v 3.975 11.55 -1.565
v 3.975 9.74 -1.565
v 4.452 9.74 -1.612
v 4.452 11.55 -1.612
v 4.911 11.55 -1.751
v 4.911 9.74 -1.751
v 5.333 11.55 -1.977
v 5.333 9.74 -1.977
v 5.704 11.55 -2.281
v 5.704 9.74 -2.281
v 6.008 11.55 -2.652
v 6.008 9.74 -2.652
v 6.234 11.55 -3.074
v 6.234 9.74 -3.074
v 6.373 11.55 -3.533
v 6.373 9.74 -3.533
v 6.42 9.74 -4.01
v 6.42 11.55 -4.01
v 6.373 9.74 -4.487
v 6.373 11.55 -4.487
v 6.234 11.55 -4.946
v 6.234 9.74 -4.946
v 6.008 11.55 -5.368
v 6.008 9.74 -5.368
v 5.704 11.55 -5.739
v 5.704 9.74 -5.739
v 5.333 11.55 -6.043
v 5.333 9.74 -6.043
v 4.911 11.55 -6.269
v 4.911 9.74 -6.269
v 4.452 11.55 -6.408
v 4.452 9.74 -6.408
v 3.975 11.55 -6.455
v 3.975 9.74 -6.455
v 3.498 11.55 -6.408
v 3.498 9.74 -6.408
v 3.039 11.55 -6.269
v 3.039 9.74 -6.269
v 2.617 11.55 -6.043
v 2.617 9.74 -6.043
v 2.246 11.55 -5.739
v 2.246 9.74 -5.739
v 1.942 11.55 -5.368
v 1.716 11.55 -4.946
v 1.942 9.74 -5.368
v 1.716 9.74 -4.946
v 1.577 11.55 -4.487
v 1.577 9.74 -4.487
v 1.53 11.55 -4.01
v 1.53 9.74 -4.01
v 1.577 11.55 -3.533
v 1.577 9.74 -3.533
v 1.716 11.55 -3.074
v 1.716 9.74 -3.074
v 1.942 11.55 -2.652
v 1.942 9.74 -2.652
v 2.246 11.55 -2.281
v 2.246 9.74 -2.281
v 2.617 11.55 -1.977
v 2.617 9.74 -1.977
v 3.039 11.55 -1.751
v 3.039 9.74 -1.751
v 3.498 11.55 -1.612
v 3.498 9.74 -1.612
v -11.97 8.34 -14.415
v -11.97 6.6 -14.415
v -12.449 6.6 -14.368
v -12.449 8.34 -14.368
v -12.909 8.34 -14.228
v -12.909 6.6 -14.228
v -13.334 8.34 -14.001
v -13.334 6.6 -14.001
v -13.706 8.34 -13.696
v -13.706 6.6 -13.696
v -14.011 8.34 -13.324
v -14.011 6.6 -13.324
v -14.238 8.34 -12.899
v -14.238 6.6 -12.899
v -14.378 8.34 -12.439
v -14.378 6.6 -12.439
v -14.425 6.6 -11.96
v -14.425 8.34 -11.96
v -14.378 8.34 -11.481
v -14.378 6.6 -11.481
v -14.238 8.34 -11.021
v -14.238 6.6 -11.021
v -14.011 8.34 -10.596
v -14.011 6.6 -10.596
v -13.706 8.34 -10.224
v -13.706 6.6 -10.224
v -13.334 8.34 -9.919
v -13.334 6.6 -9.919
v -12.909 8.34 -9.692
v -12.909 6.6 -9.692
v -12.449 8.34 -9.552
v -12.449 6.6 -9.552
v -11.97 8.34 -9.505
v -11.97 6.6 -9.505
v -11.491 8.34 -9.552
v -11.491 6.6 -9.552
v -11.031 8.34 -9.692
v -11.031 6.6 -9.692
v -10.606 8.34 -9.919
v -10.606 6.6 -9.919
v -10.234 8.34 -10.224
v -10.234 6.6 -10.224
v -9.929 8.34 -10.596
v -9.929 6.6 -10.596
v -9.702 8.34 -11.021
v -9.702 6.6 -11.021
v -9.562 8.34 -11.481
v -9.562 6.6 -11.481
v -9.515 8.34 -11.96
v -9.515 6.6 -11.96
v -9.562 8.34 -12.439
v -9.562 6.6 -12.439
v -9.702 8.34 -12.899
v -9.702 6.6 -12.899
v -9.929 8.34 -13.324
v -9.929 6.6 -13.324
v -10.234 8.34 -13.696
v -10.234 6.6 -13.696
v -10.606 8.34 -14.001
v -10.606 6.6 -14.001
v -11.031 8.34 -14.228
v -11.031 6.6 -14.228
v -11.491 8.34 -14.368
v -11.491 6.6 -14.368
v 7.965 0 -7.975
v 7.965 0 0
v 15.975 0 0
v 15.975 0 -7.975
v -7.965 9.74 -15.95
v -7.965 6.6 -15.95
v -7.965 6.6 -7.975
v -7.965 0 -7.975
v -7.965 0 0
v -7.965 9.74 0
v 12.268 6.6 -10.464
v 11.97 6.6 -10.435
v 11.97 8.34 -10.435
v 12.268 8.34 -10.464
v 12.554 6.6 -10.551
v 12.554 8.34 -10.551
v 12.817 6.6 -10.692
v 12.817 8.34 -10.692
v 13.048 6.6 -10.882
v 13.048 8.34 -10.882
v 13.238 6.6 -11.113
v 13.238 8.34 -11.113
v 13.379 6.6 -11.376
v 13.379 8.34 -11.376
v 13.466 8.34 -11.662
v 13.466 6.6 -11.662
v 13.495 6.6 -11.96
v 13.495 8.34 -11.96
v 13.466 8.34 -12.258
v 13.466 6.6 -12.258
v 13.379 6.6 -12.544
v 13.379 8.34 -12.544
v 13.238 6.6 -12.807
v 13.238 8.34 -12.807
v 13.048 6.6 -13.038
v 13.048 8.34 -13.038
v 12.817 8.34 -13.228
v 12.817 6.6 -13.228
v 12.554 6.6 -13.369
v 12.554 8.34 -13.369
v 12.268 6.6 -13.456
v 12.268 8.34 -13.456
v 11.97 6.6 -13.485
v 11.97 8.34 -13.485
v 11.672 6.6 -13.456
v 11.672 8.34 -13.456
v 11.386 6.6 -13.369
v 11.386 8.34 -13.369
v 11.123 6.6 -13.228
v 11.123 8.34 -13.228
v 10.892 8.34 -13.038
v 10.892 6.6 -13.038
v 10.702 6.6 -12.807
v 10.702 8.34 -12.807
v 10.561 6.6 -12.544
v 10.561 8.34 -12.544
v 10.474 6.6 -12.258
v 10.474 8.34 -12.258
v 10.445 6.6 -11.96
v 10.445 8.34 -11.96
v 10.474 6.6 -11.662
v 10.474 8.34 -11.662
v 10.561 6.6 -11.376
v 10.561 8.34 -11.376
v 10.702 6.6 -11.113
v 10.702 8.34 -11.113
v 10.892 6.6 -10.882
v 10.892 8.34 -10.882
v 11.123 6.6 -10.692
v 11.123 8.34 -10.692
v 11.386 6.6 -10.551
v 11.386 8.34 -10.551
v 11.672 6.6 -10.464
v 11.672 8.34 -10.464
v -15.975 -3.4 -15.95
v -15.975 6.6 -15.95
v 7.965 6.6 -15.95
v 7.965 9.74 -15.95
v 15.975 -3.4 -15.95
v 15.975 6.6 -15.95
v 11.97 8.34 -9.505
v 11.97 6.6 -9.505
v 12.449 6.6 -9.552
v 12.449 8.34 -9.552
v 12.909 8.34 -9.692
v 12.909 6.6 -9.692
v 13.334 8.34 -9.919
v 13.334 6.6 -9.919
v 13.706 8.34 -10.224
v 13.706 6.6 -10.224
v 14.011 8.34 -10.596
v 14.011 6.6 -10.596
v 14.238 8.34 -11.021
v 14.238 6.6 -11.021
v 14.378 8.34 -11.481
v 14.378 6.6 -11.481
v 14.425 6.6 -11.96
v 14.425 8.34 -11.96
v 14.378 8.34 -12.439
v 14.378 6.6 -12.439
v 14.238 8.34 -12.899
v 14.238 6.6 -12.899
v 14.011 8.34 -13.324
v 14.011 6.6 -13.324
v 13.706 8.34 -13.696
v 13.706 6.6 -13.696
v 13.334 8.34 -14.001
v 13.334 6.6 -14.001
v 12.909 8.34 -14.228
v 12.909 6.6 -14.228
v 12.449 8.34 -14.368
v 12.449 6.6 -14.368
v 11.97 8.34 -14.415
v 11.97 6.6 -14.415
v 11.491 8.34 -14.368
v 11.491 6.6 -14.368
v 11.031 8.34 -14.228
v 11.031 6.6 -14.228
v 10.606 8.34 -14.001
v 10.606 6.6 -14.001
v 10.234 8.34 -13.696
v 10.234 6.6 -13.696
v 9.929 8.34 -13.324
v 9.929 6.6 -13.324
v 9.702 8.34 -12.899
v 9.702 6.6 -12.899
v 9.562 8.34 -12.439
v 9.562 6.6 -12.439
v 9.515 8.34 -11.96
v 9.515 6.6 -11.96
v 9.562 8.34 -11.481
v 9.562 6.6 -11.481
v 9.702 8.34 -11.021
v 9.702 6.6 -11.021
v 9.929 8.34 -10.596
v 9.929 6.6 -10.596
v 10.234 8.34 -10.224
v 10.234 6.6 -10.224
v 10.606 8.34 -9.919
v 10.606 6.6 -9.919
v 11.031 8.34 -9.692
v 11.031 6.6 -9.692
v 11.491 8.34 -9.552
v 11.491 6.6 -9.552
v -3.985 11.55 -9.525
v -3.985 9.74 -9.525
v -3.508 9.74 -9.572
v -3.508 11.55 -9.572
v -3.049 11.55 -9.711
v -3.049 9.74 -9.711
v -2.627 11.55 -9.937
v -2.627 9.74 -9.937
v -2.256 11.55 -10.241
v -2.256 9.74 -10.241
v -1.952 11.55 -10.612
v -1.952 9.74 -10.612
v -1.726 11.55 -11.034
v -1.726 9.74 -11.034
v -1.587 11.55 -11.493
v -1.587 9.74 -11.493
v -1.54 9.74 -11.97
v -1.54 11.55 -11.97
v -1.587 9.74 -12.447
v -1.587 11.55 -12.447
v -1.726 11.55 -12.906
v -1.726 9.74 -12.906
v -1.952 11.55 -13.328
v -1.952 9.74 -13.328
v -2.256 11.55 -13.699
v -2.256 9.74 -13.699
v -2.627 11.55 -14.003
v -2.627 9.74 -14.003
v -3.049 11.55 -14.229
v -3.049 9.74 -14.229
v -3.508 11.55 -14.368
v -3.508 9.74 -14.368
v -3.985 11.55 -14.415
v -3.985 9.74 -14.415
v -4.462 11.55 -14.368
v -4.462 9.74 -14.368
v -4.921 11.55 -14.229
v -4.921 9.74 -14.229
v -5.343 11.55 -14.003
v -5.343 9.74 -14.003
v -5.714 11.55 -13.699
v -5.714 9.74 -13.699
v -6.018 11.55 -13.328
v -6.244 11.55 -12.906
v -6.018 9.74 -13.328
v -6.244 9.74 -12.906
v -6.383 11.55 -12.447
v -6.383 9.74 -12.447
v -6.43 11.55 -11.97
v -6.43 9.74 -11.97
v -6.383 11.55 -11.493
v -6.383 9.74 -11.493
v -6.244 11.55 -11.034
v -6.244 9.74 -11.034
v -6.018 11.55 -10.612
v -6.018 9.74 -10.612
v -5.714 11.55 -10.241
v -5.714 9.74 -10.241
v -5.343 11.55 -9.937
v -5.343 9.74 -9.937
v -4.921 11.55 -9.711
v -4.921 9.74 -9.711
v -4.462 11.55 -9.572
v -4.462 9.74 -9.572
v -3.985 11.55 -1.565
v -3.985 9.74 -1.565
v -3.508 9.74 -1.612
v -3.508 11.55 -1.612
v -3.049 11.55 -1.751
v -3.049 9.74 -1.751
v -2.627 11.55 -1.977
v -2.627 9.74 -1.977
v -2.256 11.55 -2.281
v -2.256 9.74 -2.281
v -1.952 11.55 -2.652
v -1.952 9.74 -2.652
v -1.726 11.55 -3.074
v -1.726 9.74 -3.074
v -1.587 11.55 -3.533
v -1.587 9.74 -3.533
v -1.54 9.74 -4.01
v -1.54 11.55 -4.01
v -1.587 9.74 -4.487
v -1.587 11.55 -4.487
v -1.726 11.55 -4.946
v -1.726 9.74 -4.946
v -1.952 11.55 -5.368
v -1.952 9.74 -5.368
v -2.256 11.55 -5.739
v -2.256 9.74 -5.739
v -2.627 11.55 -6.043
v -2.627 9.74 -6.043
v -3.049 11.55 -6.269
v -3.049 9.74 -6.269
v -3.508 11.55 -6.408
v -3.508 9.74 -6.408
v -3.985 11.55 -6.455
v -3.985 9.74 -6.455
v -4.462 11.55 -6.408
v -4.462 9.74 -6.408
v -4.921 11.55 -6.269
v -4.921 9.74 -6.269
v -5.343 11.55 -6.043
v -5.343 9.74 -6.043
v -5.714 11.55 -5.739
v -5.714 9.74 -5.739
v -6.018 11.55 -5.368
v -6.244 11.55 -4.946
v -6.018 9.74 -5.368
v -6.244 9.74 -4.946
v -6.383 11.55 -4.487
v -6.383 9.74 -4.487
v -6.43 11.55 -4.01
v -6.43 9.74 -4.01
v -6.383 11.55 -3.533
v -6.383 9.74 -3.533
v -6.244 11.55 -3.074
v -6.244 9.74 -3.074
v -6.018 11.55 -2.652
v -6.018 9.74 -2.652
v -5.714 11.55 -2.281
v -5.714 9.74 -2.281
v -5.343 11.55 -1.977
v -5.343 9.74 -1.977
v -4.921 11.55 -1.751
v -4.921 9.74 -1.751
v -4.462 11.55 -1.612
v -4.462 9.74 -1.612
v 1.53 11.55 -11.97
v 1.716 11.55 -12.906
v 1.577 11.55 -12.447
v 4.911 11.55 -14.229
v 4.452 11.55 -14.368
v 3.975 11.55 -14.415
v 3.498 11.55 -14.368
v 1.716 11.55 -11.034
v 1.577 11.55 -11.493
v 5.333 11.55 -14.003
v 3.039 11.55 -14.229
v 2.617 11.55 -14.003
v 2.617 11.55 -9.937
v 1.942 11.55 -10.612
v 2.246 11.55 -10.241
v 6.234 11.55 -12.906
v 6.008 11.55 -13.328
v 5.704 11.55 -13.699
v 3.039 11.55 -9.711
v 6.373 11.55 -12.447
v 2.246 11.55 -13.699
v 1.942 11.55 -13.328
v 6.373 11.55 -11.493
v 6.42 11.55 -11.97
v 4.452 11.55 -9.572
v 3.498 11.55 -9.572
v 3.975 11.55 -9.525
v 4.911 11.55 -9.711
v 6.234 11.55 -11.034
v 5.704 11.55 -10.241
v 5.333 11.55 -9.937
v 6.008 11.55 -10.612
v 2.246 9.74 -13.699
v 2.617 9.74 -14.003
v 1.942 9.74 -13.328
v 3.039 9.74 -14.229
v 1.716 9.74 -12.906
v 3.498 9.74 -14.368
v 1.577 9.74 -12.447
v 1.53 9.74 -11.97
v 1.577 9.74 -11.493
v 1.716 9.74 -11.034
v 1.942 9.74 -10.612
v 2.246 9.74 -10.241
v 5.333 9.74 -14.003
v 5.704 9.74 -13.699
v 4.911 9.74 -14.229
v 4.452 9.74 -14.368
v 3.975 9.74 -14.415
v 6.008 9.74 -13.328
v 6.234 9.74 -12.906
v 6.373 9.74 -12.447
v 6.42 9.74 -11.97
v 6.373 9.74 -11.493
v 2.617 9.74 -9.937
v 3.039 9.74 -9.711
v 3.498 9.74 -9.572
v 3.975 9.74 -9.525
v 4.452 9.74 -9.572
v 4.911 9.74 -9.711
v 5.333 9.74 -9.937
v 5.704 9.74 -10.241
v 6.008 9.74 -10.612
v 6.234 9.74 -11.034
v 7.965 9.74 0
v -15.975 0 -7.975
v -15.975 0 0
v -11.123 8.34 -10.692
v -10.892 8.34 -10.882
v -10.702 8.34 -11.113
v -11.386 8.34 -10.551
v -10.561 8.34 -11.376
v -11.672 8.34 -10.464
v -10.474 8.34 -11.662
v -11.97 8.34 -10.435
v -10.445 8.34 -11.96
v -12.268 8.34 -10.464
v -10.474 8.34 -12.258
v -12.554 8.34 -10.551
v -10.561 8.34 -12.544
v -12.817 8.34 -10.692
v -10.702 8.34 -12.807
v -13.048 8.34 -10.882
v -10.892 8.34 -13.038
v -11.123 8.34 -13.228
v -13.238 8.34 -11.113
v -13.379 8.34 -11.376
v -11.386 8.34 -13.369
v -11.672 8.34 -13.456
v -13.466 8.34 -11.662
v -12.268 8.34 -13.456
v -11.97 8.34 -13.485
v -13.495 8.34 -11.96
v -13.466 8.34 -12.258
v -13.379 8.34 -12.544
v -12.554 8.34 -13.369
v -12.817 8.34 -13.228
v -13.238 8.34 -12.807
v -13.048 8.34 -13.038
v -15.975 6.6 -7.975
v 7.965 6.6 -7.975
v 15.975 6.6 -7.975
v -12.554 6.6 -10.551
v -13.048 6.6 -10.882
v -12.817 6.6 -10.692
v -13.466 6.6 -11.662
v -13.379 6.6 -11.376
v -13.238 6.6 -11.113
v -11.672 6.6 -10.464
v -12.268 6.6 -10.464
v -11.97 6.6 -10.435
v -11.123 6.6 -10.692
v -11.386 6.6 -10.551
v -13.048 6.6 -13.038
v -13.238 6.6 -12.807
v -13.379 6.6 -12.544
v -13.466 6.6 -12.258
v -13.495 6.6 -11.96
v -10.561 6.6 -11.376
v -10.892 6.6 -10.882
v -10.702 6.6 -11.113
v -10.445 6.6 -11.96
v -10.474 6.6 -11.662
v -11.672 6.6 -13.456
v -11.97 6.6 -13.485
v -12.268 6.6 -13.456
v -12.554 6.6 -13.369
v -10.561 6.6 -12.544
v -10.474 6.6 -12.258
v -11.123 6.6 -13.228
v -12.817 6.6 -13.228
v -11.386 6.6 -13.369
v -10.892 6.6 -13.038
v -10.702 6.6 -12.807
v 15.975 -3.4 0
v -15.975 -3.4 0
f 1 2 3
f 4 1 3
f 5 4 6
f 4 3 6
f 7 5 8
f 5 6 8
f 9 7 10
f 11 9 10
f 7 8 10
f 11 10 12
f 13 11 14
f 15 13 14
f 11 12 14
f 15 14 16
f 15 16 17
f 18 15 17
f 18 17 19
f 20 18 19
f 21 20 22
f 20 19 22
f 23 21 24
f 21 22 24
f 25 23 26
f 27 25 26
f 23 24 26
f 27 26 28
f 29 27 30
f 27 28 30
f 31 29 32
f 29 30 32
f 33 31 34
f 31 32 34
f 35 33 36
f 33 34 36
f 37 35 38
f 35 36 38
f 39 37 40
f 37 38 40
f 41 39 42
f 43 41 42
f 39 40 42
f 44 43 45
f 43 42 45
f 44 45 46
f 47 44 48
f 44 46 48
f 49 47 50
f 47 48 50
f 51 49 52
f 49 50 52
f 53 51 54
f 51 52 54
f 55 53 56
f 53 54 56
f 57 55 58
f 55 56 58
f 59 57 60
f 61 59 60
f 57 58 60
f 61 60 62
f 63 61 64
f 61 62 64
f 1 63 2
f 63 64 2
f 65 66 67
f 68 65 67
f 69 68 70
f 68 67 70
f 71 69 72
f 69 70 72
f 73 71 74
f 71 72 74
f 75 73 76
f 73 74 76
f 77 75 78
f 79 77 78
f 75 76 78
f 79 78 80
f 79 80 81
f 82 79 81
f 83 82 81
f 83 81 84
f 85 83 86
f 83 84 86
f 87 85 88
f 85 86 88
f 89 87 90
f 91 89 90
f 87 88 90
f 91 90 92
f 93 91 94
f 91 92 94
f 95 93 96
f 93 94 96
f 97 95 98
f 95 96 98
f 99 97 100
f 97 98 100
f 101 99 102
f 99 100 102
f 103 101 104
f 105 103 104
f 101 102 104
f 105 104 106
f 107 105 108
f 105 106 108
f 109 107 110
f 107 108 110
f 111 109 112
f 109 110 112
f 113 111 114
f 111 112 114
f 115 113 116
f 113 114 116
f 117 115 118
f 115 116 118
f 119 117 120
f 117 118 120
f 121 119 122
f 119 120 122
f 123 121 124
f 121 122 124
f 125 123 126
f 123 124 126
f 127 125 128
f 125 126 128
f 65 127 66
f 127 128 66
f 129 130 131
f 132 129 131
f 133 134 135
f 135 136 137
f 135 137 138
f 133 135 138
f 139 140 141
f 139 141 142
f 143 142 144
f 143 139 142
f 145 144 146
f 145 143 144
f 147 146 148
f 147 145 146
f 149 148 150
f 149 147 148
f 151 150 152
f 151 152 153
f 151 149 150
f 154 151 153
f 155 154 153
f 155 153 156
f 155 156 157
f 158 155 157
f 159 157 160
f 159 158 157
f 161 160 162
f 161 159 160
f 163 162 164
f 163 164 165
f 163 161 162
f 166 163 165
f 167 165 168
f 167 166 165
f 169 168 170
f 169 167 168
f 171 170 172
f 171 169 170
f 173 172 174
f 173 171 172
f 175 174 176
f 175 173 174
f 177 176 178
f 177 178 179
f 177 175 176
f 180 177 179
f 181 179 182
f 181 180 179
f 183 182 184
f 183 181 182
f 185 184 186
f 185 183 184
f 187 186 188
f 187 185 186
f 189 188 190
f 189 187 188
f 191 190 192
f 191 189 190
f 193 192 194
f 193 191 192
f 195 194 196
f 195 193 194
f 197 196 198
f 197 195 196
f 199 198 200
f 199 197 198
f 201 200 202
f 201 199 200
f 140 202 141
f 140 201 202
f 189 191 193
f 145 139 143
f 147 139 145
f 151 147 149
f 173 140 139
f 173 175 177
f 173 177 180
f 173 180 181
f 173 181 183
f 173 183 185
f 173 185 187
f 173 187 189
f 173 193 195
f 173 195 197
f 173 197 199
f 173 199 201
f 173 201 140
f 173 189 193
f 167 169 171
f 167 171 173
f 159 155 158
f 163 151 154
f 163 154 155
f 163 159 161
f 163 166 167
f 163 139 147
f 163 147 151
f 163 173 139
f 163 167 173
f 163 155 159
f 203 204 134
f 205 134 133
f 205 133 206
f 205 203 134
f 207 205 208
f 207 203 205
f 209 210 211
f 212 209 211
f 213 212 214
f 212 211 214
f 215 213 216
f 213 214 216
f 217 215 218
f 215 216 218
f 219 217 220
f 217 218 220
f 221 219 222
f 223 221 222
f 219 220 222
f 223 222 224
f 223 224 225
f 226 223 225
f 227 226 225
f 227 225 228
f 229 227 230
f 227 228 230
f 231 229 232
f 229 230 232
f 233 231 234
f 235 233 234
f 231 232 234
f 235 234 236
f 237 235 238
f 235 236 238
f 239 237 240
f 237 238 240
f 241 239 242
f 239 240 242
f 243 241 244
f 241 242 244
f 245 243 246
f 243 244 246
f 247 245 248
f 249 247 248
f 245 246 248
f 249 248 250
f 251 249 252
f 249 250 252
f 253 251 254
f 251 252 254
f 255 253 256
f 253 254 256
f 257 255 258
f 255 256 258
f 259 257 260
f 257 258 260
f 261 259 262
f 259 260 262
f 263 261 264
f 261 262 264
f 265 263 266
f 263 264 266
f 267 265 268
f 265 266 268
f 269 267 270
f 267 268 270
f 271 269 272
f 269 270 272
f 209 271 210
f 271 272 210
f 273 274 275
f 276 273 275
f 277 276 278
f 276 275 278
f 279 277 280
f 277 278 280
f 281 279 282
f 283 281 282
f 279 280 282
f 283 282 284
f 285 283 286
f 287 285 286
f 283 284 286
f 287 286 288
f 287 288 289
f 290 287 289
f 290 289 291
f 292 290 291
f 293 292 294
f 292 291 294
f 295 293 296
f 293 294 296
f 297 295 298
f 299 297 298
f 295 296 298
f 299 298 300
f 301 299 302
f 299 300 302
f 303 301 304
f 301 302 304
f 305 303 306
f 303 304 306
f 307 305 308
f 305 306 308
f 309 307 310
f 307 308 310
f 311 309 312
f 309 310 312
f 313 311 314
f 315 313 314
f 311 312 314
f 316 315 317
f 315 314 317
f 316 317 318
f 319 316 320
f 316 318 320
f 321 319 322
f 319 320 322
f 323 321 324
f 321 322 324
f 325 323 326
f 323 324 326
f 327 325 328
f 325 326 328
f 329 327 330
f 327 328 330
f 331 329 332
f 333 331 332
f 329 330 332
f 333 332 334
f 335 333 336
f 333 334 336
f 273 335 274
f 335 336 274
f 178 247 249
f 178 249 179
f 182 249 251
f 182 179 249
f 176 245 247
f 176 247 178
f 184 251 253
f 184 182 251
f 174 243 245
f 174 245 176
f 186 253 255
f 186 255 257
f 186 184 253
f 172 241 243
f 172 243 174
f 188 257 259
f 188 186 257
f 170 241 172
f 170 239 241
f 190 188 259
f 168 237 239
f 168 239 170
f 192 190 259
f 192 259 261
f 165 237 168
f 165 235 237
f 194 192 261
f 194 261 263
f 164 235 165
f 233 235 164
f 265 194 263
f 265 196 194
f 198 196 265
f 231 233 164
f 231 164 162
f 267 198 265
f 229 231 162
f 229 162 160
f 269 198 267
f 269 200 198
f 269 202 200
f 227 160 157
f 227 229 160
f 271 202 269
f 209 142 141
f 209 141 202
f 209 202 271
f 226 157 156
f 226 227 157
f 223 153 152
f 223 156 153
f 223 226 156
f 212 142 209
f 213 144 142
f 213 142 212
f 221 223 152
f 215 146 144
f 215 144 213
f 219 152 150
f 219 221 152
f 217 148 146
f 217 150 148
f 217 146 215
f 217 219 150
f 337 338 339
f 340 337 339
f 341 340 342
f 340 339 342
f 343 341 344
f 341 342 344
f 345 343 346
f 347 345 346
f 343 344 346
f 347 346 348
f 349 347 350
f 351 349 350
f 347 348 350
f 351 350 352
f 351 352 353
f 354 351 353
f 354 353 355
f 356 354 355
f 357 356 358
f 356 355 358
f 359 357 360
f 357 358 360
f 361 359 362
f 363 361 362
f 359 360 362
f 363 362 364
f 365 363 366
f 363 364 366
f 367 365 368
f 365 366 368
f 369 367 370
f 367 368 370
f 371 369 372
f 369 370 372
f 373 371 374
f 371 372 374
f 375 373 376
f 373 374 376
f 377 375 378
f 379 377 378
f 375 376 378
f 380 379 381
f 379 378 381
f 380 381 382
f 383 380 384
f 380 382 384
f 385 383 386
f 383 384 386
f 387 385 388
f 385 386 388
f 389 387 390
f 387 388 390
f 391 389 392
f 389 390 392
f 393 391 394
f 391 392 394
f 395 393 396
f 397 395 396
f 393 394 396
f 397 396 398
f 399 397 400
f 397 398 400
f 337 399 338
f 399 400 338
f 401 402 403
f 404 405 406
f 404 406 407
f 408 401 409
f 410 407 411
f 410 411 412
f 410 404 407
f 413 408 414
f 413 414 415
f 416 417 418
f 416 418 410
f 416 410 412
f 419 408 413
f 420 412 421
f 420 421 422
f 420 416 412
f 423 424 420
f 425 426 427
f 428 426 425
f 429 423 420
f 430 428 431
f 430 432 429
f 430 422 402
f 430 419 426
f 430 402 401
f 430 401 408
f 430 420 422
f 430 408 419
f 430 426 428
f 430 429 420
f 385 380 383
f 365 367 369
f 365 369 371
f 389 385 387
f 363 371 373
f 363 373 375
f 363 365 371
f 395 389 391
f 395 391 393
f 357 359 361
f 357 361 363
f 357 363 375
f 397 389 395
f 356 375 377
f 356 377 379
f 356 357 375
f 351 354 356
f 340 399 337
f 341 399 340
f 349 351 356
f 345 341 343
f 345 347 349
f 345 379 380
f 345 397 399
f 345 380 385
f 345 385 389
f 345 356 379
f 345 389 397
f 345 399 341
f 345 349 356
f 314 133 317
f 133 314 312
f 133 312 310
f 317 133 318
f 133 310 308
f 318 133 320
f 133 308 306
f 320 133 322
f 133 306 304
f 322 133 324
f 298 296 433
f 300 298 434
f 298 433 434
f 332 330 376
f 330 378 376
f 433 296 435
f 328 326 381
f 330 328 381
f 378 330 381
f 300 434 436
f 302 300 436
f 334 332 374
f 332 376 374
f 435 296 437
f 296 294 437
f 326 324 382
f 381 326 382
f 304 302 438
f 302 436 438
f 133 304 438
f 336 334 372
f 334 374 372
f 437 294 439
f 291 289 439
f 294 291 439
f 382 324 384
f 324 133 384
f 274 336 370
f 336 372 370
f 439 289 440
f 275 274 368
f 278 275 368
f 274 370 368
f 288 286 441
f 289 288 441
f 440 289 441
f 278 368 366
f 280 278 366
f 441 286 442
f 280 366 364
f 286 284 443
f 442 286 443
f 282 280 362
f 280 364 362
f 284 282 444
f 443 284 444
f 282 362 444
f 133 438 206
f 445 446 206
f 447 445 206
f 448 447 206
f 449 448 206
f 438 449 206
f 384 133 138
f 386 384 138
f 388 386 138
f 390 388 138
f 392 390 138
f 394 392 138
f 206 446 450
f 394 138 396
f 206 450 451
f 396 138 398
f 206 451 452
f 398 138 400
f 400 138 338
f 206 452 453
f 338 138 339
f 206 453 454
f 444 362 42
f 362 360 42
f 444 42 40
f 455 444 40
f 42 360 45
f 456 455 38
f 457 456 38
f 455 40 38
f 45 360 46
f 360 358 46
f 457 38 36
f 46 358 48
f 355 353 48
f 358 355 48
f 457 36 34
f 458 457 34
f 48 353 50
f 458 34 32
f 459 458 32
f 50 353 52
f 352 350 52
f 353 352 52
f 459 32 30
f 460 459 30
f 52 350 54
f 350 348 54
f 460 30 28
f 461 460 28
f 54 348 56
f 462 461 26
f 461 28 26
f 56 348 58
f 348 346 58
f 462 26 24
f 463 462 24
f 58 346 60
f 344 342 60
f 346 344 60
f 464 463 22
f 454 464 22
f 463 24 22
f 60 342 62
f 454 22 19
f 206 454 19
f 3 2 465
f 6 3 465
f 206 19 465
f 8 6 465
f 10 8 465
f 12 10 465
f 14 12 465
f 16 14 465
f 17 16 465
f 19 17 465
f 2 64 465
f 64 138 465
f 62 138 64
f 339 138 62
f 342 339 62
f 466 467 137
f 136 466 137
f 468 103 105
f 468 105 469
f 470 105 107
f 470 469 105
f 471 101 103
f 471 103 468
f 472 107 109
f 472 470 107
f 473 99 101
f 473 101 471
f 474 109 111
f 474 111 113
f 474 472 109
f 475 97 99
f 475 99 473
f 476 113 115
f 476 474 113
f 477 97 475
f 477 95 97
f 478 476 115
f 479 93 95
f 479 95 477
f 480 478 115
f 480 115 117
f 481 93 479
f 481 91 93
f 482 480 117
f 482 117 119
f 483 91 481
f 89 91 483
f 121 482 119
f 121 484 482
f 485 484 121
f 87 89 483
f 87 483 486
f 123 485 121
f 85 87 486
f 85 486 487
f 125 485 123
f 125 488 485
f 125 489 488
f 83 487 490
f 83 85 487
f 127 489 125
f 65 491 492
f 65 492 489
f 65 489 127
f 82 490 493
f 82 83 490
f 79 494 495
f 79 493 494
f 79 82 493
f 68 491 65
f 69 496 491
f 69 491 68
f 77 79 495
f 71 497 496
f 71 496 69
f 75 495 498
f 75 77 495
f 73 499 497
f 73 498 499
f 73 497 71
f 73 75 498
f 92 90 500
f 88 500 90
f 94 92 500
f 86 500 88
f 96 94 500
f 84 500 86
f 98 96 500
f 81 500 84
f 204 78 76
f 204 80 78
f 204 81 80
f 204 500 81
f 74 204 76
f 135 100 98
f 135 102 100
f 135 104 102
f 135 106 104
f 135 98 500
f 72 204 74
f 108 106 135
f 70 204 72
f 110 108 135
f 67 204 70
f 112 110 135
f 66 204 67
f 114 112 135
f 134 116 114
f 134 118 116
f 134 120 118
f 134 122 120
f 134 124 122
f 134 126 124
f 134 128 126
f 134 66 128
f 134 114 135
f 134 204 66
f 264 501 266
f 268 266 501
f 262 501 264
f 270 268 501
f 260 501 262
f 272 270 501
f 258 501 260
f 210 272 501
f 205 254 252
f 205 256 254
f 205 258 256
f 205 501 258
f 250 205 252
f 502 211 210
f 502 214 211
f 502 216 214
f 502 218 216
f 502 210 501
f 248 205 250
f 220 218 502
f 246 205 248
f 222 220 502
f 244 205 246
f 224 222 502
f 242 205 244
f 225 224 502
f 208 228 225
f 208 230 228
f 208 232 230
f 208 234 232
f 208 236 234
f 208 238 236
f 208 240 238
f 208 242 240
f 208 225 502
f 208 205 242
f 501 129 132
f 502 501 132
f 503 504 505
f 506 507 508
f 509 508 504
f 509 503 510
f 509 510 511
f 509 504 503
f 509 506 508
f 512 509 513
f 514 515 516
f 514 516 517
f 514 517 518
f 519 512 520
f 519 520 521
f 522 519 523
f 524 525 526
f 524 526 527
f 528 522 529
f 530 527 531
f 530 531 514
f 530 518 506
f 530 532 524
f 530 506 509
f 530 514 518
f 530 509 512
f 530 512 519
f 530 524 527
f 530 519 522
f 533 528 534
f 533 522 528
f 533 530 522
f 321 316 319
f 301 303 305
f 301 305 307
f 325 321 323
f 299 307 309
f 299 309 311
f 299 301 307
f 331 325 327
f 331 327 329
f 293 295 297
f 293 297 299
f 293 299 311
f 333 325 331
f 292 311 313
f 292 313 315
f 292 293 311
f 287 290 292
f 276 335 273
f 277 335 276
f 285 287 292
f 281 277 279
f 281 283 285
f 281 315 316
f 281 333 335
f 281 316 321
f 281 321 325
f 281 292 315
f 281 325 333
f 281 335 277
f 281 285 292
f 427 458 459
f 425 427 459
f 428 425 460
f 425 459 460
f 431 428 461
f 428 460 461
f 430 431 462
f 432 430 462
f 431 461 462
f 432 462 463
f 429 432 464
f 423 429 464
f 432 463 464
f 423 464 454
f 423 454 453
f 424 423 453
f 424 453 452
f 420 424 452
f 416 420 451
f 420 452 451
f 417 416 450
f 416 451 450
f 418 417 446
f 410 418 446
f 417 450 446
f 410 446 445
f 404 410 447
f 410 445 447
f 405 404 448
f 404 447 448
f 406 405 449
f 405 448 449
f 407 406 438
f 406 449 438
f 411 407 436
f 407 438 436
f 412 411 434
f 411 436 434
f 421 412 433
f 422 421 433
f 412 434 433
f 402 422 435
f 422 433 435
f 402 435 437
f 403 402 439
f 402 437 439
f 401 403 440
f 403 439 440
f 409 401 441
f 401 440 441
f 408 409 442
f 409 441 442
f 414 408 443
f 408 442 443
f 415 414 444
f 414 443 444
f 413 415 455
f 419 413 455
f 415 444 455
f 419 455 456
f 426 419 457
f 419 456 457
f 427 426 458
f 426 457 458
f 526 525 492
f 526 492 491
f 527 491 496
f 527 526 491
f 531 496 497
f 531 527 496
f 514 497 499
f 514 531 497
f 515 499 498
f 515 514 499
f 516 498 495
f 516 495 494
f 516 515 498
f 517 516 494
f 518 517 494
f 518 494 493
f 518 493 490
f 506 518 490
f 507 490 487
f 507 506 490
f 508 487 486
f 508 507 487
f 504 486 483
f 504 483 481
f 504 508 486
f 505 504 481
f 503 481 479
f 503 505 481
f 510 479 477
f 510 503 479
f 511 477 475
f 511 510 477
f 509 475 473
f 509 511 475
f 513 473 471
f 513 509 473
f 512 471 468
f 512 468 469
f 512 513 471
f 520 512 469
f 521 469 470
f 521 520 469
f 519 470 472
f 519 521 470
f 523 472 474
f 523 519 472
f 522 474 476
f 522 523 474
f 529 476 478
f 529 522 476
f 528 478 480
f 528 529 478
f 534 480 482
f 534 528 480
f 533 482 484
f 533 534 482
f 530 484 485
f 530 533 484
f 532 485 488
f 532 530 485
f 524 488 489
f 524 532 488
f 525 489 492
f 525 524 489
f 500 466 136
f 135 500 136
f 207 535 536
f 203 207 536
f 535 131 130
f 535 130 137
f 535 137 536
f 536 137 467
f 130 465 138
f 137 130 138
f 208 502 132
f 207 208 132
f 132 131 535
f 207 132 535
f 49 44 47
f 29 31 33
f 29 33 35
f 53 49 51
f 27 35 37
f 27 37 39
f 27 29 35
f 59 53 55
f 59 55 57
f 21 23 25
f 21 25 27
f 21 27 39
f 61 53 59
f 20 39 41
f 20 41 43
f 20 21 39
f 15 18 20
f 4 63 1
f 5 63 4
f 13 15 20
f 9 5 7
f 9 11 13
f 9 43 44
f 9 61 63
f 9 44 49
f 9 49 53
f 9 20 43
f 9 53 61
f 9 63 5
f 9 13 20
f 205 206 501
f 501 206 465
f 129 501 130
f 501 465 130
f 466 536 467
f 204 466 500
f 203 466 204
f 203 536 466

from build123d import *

# Parameters (mm, degrees)
BOSS_EXTRUDE2_DEPTH = 15.95
SKETCH2_R           = 2.445
BOSS_EXTRUDE3_DEPTH = 1.81
SKETCH3_W           = 8.01
SKETCH3_H           = 7.975
BOSS_EXTRUDE4_DEPTH = 6.6
SKETCH4_R           = 2.455
SKETCH4_R_2         = 1.525
BOSS_EXTRUDE5_DEPTH = 1.74


with BuildPart() as part:
    # Sketch1 → Boss-Extrude2 (new body)
    with BuildSketch(Plane.XY):
        Polygon((-7.965, 9.74), (7.965, 9.74), (7.965, 0), (15.975, 0), (15.975, -3.4), (-15.975, -3.4), (-15.975, 0), (-7.965, 0), align=None)
    extrude(amount=-BOSS_EXTRUDE2_DEPTH)

    # Sketch2 → Boss-Extrude3 (add)
    with BuildSketch(Plane(origin=(0, 9.74, 0), x_dir=(1, 0, 0), z_dir=(0, 1, 0))):
        with Locations(Location((-3.985, 11.97, 0), (0, 0, 270))):
            Circle(SKETCH2_R)
        with Locations(Location((3.975, 11.97, 0), (0, 0, 270))):
            Circle(SKETCH2_R)
        with Locations(Location((3.975, 4.01, 0), (0, 0, 270))):
            Circle(SKETCH2_R)
        with Locations(Location((-3.985, 4.01, 0), (0, 0, 270))):
            Circle(SKETCH2_R)
    extrude(amount=BOSS_EXTRUDE3_DEPTH)

    # Sketch3 → Boss-Extrude4 (add)
    with BuildSketch(Plane(origin=(0, 0, 0), x_dir=(1, 0, 0), z_dir=(0, 1, 0))):
        with Locations((-11.97, 11.9625)):
            Rectangle(SKETCH3_W, SKETCH3_H)
        with Locations((11.97, 11.9625)):
            Rectangle(SKETCH3_W, SKETCH3_H)
    extrude(amount=BOSS_EXTRUDE4_DEPTH)

    # Sketch4 → Boss-Extrude5 (add)
    # profile 1 of 2: a face of its own
    with BuildSketch(Plane(origin=(0, 6.6, 0), x_dir=(1, 0, 0), z_dir=(0, 1, 0))):
        with Locations(Location((11.97, 11.96, 0), (0, 0, 270))):
            Circle(SKETCH4_R)
        with Locations(Location((11.97, 11.96, 0), (0, 0, 270))):
            Circle(SKETCH4_R_2, mode=Mode.SUBTRACT)
    # profile 2 of 2: a face of its own
    with BuildSketch(Plane(origin=(0, 6.6, 0), x_dir=(1, 0, 0), z_dir=(0, 1, 0))):
        with Locations(Location((-11.97, 11.96, 0), (0, 0, 90))):
            Circle(SKETCH4_R)
        with Locations(Location((-11.97, 11.96, 0), (0, 0, 90))):
            Circle(SKETCH4_R_2, mode=Mode.SUBTRACT)
    extrude(amount=BOSS_EXTRUDE5_DEPTH)


solid = part.part
